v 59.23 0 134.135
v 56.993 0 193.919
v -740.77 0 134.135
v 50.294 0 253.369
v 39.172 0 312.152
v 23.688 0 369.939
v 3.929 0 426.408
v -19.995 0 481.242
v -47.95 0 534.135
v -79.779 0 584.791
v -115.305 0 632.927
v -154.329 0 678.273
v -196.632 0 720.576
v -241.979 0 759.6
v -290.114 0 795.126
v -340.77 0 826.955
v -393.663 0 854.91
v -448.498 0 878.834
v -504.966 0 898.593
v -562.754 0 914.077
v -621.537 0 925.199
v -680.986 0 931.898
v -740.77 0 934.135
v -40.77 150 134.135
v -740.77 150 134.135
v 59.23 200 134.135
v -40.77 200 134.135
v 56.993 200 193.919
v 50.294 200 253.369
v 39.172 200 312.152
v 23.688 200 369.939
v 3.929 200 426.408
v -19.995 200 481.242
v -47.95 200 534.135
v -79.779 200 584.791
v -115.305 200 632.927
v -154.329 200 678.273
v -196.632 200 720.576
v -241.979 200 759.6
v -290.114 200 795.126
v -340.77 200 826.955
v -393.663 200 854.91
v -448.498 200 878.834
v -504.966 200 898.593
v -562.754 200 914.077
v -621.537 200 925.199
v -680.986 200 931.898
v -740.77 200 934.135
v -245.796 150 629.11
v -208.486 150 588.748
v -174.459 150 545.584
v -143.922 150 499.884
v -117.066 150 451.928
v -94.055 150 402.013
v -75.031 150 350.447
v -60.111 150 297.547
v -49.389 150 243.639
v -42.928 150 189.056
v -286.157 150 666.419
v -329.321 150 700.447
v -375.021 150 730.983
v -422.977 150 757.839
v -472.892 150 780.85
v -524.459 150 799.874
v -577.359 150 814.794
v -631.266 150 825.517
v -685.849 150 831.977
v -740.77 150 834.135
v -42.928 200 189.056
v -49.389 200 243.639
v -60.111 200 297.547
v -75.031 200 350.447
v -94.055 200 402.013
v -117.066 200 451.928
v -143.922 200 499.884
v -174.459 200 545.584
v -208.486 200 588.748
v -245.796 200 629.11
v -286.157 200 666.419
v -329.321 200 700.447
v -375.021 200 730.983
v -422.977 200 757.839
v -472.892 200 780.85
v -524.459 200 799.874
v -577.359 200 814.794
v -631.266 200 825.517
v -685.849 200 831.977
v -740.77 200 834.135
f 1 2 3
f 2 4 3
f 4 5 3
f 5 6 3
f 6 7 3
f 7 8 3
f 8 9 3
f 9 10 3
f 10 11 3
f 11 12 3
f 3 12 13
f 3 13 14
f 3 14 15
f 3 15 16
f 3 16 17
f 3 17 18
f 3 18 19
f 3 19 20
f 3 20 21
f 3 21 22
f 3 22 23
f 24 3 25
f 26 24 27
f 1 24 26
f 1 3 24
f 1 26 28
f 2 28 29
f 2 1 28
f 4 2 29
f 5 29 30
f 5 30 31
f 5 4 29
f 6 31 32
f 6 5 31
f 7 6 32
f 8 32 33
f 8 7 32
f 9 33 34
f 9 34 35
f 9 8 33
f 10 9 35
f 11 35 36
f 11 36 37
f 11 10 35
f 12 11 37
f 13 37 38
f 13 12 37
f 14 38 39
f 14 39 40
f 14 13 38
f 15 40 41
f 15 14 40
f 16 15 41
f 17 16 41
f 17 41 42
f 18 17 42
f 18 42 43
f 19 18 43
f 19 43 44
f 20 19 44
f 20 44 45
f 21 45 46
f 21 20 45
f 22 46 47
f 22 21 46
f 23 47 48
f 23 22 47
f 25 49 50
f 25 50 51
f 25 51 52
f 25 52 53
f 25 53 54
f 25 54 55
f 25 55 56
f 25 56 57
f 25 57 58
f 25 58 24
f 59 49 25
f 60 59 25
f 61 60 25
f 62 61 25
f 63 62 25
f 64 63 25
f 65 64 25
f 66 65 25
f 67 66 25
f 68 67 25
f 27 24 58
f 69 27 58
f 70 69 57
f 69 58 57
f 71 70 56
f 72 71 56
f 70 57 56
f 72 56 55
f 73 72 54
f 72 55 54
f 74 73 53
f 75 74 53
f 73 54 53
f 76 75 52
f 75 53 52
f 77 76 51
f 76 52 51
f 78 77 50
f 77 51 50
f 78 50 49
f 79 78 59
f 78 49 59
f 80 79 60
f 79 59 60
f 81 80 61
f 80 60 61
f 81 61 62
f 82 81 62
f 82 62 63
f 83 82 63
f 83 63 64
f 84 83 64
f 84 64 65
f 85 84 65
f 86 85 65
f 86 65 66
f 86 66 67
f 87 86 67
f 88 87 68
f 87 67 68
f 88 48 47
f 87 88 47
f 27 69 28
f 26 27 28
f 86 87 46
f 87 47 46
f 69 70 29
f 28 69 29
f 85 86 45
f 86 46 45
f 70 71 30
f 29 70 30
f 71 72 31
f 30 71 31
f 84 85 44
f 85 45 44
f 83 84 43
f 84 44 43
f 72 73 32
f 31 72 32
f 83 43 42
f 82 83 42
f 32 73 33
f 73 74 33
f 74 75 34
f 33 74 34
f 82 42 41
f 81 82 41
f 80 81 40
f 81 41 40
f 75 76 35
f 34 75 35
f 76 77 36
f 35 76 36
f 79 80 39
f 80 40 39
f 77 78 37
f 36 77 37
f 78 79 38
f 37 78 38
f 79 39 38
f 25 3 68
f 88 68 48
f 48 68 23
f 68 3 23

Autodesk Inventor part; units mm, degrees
ref_plane "YZ Plane" through (0, 0, 0) normal (1, 0, 0) x (0, 1, 0)
ref_plane "XZ Plane" through (0, 0, 0) normal (0, 1, 0) x (-1, 0, 0)
ref_plane "XY Plane" through (0, 0, 0) normal (0, 0, 1) x (1, 0, 0)
sketch "Sketch1" plane through (0, 0, 0) normal (0, 1, 0) x (-1, 0, 0)
  arc A0 (740.7704, 834.1348) -> (40.7704, 134.1348) centre (740.7704, 134.1348) ccw
  line L0 (740.7704, 134.1348) -> (40.7704, 134.1348)
  line L1 (740.7704, 134.1348) -> (740.7704, 834.1348)
  line L2 (909.7653, 0) -> (-273.1993, 0) projected
  dimension "d2" = 1400
extrude "Extrusion1" add sketch "Sketch1" along normal blind 150
sketch "Sketch2" plane through (0, 0, 0) normal (0, -1, 0) x (1, 0, 0)
  arc A0 (-40.7704, 134.1348) -> (-740.7704, 834.1348) centre (-740.7704, 134.1348) ccw projected
  line L0 (-740.7704, 134.1348) -> (-740.7704, 834.1348) projected
  line L1 (-40.7704, 134.1348) -> (-740.7704, 134.1348) projected
  arc A1 (59.2296, 134.1348) -> (-740.7704, 934.1348) centre (-740.7704, 134.1348) ccw
  arc A2 (-40.7704, 134.1348) -> (-740.7704, 834.1348) centre (-740.7704, 134.1348) ccw projected
  line L2 (-40.7704, 134.1348) -> (59.2296, 134.1348)
  line L3 (-740.7704, 834.1348) -> (-740.7704, 934.1348)
  point P0 (0, 0)
  dimension "d5" = 100
extrude "Extrusion2" add sketch "Sketch2" against normal blind 200 contours A0 L3 A1 L2
properties part number "McCrea_zakruta_walle"
